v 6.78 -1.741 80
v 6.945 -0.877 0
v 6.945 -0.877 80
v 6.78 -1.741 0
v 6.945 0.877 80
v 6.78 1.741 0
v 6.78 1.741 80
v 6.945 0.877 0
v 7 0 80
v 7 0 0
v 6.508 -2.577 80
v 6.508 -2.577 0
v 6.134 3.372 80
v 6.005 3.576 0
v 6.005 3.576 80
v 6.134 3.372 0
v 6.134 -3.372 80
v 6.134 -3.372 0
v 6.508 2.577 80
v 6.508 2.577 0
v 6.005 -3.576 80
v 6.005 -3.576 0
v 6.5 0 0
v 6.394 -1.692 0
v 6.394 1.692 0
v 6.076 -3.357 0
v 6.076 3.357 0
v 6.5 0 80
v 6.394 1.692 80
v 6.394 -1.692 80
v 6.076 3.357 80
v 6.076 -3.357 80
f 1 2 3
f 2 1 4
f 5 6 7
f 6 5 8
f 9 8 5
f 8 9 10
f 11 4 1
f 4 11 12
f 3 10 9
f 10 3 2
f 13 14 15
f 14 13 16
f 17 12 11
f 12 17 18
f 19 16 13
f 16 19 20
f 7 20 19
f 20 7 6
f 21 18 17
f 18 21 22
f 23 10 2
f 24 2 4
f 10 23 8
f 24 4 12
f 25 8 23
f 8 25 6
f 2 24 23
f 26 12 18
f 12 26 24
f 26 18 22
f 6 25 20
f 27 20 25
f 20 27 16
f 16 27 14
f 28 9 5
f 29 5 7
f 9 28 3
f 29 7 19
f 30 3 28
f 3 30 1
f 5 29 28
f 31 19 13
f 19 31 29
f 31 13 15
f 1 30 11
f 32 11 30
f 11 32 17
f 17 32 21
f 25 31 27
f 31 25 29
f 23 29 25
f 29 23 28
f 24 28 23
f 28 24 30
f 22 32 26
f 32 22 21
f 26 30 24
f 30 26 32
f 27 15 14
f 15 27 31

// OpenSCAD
$fn = 50;


difference() {
	union() {
		cylinder(h = 80, r = 7.0000000000);
		translate(v = [-10.0000000000, 0, 0]) {
			cylinder(h = 80, r = 7.0000000000);
		}
	}
	union() {
		cylinder(h = 80, r = 3.2500000000);
		cylinder(h = 80, r = 1.8000000000);
		cylinder(h = 80, r = 1.8000000000);
		cylinder(h = 80, r = 1.8000000000);
		translate(v = [-14.5000000000, 0, 0]) {
			hull() {
				translate(v = [-3.7500000000, 0.0000000000, 0]) {
					cylinder(h = 80, r = 7.5000000000);
				}
				translate(v = [3.7500000000, 0.0000000000, 0]) {
					cylinder(h = 80, r = 7.5000000000);
				}
				translate(v = [-3.7500000000, -0.0000000000, 0]) {
					cylinder(h = 80, r = 7.5000000000);
				}
				translate(v = [3.7500000000, -0.0000000000, 0]) {
					cylinder(h = 80, r = 7.5000000000);
				}
			}
		}
		translate(v = [-7.0000000000, 0, 0.0000000000]) {
			cylinder(h = 80, r = 13.5000000000);
		}
	}
}
